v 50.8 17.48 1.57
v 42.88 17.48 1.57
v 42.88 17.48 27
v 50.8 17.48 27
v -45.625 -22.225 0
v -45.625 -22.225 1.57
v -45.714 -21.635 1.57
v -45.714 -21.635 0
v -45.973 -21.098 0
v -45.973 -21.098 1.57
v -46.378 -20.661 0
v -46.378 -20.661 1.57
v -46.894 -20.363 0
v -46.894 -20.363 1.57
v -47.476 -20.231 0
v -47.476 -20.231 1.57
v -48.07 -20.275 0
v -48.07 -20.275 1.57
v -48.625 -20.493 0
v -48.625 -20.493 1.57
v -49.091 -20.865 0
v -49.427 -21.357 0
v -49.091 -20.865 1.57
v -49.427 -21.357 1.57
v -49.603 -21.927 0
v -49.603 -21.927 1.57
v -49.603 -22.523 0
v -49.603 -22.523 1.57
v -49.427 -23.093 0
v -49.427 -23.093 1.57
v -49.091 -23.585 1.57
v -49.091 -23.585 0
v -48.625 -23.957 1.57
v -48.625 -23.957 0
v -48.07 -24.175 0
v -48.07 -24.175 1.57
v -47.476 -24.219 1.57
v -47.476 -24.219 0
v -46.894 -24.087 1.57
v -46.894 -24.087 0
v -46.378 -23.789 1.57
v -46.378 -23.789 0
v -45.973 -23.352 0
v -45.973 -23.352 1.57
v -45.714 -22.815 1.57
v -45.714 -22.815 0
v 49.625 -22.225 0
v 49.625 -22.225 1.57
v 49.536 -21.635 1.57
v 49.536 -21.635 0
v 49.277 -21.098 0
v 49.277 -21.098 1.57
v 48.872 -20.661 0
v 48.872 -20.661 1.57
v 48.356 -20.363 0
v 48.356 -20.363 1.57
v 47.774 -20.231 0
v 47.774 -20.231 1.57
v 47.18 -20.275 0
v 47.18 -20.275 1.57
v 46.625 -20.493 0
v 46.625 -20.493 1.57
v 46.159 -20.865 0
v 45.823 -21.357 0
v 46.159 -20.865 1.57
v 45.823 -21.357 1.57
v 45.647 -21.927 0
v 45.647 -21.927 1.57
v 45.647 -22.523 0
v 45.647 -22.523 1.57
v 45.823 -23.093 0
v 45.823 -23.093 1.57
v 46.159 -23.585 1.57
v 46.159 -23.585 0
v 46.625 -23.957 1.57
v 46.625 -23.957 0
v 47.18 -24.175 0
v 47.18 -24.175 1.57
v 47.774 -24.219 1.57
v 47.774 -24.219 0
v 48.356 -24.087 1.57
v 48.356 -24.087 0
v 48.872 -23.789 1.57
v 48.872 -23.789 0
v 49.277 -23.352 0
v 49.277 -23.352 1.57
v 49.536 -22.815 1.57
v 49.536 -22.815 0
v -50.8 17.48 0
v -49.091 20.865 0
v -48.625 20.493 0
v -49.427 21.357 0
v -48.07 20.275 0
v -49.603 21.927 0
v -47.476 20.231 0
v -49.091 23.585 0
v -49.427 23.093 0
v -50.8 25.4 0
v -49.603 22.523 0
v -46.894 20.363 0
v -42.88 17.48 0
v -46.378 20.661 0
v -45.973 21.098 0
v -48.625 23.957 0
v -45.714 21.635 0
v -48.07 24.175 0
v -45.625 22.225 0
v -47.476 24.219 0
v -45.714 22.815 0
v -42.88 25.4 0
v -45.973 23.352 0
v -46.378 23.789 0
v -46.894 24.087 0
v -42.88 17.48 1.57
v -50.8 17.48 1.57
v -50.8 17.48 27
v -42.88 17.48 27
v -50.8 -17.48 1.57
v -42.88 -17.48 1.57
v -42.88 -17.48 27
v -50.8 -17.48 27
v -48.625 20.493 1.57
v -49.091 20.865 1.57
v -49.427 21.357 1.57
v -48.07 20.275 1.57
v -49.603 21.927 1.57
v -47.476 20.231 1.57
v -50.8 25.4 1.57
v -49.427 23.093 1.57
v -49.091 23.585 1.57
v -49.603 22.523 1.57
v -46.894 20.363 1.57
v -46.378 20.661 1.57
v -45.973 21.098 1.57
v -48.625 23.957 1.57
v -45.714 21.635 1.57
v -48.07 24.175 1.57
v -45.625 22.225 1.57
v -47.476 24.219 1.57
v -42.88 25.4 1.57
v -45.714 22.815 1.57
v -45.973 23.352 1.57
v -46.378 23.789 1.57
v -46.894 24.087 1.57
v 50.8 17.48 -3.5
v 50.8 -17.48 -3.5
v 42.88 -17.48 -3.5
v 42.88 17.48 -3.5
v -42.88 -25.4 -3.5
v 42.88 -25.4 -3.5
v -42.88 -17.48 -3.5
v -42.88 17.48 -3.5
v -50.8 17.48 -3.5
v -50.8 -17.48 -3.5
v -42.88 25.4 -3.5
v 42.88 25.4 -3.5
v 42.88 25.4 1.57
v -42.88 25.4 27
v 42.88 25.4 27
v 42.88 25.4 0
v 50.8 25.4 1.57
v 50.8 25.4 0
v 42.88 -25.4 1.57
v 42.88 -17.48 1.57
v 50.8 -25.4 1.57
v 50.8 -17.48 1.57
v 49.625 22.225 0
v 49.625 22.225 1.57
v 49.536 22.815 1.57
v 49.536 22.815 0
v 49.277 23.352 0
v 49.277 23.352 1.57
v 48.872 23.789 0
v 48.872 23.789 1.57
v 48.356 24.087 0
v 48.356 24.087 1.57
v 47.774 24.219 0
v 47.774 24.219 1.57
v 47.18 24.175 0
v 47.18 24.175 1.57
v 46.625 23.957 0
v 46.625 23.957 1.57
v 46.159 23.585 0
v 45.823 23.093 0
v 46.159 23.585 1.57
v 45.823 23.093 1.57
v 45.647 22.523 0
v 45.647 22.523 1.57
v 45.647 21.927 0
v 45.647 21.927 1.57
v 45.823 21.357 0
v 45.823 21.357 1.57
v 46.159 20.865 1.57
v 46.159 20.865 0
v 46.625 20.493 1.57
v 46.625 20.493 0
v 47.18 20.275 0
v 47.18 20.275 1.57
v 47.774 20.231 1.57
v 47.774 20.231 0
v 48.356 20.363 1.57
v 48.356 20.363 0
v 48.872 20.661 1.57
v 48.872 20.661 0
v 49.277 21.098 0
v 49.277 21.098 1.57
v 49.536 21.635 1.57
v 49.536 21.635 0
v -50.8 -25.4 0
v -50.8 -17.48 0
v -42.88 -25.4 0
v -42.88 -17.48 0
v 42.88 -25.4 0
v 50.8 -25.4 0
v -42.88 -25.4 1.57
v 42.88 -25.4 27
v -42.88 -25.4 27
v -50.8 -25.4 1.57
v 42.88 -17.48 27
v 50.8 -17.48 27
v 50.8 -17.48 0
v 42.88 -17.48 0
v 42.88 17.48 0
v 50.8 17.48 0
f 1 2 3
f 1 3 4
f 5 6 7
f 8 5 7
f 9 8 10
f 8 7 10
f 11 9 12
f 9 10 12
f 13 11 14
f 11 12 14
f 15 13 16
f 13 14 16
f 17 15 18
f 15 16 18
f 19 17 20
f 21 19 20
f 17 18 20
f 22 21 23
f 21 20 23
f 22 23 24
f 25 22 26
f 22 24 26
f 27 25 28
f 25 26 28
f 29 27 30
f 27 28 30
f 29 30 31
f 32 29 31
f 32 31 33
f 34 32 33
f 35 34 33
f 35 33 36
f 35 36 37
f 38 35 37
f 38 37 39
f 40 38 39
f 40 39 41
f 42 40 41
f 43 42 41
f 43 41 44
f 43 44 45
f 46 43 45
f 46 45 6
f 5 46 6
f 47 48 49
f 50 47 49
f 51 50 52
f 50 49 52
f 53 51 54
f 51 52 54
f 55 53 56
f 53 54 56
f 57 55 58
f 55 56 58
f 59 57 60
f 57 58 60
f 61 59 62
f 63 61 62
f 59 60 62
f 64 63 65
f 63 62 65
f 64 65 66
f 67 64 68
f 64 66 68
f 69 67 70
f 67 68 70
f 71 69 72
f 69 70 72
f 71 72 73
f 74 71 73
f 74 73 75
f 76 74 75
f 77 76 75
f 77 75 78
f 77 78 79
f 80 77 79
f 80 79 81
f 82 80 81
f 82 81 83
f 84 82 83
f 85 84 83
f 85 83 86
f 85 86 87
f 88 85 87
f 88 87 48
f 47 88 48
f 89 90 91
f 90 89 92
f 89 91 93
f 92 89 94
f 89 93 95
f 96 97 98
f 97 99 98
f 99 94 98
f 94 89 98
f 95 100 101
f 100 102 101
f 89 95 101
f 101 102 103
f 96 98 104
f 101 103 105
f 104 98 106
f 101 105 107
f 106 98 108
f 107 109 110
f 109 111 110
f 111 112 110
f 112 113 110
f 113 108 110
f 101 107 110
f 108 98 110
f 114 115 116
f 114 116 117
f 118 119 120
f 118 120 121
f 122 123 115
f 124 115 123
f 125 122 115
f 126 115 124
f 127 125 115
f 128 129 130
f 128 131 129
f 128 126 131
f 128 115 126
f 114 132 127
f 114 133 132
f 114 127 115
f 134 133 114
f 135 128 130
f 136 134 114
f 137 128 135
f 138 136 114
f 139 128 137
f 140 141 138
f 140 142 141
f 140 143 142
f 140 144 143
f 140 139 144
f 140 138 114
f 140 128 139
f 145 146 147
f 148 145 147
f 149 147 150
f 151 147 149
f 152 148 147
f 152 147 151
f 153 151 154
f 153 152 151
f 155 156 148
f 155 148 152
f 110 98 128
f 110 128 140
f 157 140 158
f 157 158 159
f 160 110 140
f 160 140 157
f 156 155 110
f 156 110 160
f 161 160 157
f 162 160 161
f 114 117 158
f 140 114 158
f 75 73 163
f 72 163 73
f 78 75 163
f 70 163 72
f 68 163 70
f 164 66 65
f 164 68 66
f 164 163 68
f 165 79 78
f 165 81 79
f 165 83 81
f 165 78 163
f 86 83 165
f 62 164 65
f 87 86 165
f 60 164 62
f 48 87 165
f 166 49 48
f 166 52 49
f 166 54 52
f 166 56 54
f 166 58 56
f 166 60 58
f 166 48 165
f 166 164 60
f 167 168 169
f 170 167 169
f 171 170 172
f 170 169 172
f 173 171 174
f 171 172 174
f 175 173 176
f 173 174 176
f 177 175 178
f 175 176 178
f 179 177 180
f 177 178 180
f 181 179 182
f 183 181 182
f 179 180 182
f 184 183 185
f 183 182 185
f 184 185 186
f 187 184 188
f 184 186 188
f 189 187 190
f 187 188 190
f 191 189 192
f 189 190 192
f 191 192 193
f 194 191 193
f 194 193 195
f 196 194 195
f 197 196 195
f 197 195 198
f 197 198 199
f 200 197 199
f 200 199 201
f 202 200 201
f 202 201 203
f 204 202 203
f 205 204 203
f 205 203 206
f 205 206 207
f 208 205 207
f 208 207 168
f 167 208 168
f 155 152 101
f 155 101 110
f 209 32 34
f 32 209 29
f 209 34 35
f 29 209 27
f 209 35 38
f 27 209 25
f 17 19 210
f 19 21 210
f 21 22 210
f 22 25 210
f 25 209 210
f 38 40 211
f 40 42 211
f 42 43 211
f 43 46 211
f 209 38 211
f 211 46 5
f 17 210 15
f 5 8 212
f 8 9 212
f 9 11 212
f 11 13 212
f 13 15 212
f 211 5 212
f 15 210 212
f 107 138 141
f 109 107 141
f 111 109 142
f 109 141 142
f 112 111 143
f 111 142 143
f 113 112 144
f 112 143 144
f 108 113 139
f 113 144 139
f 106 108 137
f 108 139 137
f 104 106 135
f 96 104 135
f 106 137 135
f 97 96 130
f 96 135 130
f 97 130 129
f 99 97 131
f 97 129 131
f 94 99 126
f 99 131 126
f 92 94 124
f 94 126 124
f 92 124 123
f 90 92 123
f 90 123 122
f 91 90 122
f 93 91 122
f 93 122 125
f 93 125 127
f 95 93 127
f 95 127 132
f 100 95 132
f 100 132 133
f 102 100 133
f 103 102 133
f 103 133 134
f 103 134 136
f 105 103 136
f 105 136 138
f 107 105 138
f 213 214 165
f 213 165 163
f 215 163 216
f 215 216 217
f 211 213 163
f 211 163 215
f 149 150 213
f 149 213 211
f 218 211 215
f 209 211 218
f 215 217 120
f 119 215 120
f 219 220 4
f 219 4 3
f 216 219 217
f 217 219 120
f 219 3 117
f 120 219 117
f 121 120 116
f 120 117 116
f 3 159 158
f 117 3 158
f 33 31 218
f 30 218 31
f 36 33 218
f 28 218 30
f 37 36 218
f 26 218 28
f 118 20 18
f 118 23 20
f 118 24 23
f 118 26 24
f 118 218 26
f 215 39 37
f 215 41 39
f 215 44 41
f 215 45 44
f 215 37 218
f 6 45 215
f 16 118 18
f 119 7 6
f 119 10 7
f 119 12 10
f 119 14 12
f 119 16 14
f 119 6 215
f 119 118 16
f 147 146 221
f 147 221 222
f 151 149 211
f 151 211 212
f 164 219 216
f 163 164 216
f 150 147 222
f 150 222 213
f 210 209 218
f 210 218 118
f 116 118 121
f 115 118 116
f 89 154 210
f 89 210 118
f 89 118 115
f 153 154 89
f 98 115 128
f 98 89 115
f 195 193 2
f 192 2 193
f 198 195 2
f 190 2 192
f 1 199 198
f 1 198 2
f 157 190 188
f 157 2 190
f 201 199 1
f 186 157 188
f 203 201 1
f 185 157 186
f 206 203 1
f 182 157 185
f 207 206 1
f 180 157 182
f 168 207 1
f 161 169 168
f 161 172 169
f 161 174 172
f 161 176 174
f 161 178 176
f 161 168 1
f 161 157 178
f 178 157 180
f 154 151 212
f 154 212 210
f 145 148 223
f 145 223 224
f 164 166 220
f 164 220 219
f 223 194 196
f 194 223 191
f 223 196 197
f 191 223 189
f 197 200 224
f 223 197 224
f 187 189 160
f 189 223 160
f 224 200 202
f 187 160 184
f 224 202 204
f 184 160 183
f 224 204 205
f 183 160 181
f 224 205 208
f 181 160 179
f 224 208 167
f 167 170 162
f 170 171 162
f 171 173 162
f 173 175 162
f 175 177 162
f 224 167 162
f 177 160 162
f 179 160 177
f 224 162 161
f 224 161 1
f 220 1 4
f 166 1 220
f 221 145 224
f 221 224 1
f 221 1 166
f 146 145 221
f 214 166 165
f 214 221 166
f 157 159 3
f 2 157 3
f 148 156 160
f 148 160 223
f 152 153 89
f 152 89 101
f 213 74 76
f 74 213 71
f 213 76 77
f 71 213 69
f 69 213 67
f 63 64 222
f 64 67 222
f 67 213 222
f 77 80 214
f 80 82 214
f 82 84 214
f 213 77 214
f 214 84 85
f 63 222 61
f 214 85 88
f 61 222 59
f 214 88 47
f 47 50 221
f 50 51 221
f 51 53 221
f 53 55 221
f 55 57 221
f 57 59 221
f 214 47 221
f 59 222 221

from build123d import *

# Parameters (mm, degrees)
SCHIZZO1_W                        = 101.6
SCHIZZO1_H                        = 50.8
ESTRUSIONE_ESTRUSIONE1_DEPTH      = 1.57
SCHIZZO2_R                        = 2
TAGLIO_ESTRUSIONE1_DEPTH          = 57.817822028
ESTRUSIONE_ESTRUSIONE2_DEPTH      = 25.43
ESTRUSIONE_ESTRUSIONE2_DEPTH_BACK = 5.07


with BuildPart() as part:
    # Schizzo1 → Estrusione-Estrusione1 (new body)
    with BuildSketch(Plane.XY):
        Rectangle(SCHIZZO1_W, SCHIZZO1_H)
    extrude(amount=ESTRUSIONE_ESTRUSIONE1_DEPTH)

    # Schizzo2 → Taglio-Estrusione1 (cut, through all)
    with BuildSketch(Plane.XY.offset(1.57)):
        with Locations((-47.625, 22.225)):
            Circle(SCHIZZO2_R)
        with Locations((47.625, 22.225)):
            Circle(SCHIZZO2_R)
        with Locations((47.625, -22.225)):
            Circle(SCHIZZO2_R)
        with Locations((-47.625, -22.225)):
            Circle(SCHIZZO2_R)
    extrude(amount=-TAGLIO_ESTRUSIONE1_DEPTH, mode=Mode.SUBTRACT)

    # Schizzo3 → Estrusione-Estrusione2 (add, two sides: drawn at the far end of the back side and taken through both)
    with BuildSketch(Plane.XY.offset(1.57).offset(-ESTRUSIONE_ESTRUSIONE2_DEPTH_BACK)):
        Polygon((-50.8, 17.48), (-42.88, 17.48), (-42.88, 25.4), (42.88, 25.4), (42.88, 17.48), (50.8, 17.48), (50.8, -17.48), (42.88, -17.48), (42.88, -25.4), (-42.88, -25.4), (-42.88, -17.48), (-50.8, -17.48), align=None)
    extrude(amount=ESTRUSIONE_ESTRUSIONE2_DEPTH + ESTRUSIONE_ESTRUSIONE2_DEPTH_BACK)


solid = part.part
